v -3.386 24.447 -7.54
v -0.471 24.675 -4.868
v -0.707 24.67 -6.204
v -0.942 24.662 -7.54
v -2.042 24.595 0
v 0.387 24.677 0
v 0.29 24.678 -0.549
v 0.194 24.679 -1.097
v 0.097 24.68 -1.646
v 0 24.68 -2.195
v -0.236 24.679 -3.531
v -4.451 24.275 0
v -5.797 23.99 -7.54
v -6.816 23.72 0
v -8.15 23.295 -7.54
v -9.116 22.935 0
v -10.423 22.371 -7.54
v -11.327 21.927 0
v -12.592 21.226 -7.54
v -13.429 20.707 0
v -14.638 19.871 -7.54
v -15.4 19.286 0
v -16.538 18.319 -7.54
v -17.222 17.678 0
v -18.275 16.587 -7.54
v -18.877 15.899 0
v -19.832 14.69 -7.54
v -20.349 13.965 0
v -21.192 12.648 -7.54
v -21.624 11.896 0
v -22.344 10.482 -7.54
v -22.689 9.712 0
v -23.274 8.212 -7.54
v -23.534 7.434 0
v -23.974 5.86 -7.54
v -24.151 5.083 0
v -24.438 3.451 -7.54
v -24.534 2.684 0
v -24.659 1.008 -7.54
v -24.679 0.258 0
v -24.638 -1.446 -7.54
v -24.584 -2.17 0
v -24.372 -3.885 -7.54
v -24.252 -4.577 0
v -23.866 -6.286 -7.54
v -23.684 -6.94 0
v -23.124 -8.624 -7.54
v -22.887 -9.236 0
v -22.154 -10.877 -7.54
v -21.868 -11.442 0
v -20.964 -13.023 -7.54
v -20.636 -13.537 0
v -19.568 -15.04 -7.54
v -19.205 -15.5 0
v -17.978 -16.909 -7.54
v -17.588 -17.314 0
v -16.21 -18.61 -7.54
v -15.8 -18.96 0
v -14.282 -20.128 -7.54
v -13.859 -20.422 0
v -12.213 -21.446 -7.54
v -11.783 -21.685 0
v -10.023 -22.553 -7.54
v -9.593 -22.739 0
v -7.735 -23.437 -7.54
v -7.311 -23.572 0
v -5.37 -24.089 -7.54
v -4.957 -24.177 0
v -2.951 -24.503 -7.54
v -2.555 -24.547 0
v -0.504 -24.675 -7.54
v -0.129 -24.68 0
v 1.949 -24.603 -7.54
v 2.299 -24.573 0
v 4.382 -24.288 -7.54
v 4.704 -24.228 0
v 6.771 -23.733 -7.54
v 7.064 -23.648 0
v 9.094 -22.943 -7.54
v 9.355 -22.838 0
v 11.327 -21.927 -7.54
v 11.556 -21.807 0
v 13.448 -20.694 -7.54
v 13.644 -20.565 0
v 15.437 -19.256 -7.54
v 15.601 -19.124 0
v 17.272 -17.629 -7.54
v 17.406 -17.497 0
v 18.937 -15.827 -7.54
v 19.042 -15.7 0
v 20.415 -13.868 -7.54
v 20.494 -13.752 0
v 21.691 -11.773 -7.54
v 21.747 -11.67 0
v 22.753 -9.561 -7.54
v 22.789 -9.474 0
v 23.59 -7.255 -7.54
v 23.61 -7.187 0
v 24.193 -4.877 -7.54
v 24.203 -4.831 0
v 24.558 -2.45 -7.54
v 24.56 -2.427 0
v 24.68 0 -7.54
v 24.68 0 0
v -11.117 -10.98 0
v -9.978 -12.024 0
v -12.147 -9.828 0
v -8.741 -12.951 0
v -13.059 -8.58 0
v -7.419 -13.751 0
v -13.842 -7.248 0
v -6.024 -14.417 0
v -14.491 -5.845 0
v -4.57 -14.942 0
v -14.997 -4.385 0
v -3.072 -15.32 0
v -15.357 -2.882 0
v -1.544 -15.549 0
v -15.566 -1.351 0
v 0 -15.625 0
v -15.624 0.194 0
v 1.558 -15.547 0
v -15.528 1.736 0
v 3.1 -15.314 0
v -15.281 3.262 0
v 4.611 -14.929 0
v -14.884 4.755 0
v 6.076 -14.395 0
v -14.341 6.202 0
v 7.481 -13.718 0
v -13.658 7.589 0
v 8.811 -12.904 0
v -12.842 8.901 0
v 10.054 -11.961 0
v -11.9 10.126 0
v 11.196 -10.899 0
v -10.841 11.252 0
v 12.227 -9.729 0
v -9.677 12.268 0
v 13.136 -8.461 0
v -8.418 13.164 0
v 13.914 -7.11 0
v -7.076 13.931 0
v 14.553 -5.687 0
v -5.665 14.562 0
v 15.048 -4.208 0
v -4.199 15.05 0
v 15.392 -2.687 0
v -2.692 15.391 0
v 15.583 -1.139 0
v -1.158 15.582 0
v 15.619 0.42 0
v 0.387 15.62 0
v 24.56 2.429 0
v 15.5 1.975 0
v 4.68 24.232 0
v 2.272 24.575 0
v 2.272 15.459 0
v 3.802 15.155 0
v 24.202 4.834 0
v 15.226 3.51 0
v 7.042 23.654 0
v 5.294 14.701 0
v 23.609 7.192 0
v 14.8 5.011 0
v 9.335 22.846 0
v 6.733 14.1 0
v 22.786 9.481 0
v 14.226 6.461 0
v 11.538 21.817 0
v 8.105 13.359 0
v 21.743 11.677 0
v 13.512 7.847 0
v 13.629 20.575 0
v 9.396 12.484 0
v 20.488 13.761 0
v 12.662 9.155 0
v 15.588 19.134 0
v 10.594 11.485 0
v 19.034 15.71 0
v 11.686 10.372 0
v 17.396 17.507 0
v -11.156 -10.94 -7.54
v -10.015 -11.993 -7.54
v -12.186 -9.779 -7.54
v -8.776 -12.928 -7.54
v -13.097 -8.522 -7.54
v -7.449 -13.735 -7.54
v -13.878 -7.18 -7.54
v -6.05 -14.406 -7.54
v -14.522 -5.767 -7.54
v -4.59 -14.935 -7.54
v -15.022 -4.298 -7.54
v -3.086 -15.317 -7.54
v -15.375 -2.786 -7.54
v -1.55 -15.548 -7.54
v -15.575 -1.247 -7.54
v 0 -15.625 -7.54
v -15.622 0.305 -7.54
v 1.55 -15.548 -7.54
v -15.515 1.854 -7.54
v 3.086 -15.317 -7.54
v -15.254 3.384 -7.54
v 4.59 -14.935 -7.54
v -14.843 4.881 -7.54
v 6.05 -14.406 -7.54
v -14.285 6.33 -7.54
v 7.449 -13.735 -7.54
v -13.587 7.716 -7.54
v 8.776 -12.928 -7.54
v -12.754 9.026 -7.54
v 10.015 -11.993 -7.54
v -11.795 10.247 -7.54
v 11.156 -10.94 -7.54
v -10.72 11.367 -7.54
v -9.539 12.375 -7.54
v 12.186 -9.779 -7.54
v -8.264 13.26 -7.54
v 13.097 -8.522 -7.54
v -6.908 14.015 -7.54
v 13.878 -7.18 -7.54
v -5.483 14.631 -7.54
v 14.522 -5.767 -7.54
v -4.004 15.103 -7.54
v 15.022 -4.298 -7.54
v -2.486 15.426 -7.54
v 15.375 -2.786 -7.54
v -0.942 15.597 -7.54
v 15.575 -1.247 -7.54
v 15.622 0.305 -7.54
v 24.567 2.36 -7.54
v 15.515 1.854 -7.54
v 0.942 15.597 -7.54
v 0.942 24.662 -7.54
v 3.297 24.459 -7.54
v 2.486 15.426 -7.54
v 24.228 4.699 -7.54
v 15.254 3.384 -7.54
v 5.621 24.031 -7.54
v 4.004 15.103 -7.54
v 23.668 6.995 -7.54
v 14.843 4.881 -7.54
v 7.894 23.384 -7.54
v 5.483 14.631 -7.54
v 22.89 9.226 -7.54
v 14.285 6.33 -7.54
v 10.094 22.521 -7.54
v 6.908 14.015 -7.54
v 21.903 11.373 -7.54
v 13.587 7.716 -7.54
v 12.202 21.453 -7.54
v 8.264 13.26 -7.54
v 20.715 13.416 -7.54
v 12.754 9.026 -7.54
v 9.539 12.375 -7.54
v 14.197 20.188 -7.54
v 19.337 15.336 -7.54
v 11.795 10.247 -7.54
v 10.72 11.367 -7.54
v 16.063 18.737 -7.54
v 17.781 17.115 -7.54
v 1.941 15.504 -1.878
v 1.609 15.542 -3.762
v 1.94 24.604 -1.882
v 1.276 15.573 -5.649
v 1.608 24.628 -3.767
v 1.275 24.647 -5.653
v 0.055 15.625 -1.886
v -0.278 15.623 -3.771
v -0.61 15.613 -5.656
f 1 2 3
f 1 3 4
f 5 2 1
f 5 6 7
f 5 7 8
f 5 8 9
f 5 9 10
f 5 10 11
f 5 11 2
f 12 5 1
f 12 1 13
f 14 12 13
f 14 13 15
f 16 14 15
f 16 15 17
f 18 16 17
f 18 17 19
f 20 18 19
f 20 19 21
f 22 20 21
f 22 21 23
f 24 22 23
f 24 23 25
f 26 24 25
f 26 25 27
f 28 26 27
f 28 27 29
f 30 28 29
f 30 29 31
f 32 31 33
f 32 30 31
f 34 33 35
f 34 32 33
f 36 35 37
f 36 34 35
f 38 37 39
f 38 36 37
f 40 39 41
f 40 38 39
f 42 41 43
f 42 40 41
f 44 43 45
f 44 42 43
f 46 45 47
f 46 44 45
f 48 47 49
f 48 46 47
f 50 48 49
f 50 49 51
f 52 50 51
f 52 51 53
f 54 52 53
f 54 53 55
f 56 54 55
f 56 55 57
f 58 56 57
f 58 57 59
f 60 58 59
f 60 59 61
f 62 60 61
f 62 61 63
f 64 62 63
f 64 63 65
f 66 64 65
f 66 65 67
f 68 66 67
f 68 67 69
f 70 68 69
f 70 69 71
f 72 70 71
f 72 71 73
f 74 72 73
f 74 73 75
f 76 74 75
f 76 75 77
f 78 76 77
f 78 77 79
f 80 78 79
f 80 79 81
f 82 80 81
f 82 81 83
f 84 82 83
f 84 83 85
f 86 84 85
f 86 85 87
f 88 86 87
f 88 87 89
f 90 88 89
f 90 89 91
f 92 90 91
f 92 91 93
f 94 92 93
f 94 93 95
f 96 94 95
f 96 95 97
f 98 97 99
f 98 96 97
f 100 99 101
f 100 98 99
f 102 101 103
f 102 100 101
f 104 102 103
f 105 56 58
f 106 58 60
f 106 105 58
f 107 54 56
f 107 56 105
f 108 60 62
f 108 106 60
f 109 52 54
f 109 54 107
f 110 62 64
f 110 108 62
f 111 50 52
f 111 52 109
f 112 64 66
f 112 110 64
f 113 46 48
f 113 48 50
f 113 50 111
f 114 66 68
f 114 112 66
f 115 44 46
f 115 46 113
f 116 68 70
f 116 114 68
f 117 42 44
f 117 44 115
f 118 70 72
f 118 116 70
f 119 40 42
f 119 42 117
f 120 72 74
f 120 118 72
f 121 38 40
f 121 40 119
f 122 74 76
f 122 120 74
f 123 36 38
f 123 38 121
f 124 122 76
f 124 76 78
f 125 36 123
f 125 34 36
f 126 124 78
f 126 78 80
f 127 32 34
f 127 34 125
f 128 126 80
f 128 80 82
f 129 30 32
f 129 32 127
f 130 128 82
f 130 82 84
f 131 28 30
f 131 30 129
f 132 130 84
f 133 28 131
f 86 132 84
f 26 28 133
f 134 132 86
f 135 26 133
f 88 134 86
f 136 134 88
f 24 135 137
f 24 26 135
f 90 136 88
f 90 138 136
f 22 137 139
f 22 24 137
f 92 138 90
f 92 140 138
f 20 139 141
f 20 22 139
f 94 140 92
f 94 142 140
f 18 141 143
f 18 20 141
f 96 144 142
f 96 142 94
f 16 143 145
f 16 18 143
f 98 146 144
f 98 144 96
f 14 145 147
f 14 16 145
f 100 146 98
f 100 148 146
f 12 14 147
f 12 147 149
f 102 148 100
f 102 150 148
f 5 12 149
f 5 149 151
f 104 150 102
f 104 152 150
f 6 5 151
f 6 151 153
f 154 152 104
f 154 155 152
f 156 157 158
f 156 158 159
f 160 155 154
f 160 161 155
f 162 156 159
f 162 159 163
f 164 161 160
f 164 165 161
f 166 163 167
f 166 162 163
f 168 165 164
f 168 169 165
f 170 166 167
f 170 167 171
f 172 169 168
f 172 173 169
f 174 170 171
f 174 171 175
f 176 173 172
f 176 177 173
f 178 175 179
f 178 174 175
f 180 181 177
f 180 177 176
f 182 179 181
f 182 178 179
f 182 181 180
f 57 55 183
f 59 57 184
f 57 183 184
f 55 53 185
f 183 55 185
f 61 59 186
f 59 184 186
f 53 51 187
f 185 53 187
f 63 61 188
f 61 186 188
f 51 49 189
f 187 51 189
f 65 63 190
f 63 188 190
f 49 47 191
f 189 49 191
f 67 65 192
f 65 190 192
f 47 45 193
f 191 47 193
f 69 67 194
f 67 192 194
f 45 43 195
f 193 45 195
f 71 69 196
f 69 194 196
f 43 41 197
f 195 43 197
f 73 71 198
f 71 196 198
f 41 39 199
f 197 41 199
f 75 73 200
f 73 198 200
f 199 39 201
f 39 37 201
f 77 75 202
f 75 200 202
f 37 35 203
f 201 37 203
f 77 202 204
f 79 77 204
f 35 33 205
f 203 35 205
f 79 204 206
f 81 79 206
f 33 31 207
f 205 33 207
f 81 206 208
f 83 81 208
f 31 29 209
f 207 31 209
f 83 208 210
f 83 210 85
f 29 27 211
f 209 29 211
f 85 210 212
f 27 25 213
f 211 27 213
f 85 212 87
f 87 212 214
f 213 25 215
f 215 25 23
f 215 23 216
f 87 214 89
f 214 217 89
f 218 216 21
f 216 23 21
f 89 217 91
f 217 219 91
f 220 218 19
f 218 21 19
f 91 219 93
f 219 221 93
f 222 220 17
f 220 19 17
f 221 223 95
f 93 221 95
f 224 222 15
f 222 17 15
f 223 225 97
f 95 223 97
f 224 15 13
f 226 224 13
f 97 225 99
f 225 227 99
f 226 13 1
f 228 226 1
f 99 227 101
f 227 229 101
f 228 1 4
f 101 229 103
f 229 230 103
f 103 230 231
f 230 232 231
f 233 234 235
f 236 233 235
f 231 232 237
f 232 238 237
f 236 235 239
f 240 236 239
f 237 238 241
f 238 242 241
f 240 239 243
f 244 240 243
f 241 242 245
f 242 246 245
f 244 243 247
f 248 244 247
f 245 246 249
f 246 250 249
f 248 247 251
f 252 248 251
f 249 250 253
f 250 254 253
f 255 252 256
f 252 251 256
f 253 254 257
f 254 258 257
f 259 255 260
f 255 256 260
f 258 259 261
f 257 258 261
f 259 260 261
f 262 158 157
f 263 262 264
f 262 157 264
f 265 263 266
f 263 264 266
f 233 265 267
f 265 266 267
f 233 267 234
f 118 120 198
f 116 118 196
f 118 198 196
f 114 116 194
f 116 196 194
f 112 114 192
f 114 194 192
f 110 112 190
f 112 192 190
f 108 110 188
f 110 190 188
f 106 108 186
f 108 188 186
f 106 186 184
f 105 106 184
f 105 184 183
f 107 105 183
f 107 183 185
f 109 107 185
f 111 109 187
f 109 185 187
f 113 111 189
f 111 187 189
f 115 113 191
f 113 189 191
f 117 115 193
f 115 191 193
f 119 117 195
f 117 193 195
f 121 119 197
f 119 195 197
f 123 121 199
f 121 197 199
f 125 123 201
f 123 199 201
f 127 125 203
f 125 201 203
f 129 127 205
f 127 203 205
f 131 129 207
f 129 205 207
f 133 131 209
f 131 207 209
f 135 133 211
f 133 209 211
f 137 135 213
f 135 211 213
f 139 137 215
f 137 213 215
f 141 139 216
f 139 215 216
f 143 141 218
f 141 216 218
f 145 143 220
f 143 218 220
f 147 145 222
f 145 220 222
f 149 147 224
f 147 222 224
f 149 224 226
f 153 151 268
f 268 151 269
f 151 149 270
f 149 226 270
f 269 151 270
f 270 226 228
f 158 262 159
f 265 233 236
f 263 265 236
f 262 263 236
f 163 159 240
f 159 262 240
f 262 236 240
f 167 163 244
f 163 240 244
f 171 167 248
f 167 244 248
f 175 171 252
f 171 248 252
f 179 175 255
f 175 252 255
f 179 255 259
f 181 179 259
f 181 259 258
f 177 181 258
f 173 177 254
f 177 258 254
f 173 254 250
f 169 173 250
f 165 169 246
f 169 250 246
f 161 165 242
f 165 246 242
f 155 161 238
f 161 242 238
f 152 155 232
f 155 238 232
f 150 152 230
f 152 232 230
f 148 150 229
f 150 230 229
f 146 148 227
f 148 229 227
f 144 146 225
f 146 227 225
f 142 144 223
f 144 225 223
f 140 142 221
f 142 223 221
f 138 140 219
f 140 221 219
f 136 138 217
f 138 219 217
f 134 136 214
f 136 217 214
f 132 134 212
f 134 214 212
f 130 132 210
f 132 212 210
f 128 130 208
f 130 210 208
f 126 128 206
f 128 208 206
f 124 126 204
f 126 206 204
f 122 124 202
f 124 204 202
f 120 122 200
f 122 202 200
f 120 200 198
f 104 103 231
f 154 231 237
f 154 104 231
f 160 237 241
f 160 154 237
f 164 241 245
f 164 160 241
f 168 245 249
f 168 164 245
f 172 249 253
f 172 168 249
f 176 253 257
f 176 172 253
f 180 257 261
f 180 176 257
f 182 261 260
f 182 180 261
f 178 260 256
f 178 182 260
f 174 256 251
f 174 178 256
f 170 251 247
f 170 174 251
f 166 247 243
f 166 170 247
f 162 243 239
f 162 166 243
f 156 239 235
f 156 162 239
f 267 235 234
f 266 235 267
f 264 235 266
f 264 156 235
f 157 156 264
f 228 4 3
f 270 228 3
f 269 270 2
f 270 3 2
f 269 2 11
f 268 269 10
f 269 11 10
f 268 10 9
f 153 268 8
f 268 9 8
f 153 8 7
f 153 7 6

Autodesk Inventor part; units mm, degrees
ref_plane "WorkPlane1" through (0, 0, 0) normal (0, 0, 1) x (1, 0, 0)
ref_plane "WorkPlane3" through (0, 0, -7.54) normal (0, 0, 1) x (1, 0, 0)
ref_plane "Work Plane3" through (0, -24.68, 0) normal (0, 1, 0) x (-1, 0, 0)
ref_plane "WorkPlane10" through (0, 24.68, 0) normal (0, 1, 0) x (-1, 0, 0)
sketch "Sketch1" plane through (0, 0, 0) normal (0, 0, 1) x (1, 0, 0)
  point P0 (0, 0)
sketch "Sketch2" plane through (0, 0, 0) normal (0, 0, 1) x (1, 0, 0)
  circle A0 centre (0, 0) radius 24.68
  dimension "d3" = 49.36
extrude "Extrusion1" add sketch "Sketch2" against normal blind 7.54
sketch "Sketch3" plane through (0, 0, -7.54) normal (0, 0, 1) x (1, 0, 0)
  point P0 (0, 0)
sketch "Sketch4" plane through (0, 0, 0) normal (0, 0, 1) x (1, 0, 0)
  circle A0 centre (0, 0) radius 24.68 projected
hole "Hole1" at (0, 0, 0) direction (0, 0, -1) diameter 31.25 end through all
sketch "Sketch5" plane through (0, 24.68, 0) normal (0, 1, 0) x (-1, 0, 0)
  line L0 (-0.387, 0) -> (-2.272, 0)
  line L1 (0.9425, -7.54) -> (-0.387, 0)
  line L2 (-0.9425, -7.54) -> (0.9425, -7.54)
  line L3 (-2.272, 0) -> (-0.9425, -7.54)
  line L4 (-15.625, 0) -> (15.625, 0) construction
  line L5 (24.68, -7.54) -> (-24.68, -7.54) construction
  line L6 (0, -9.048) -> (0, 1.508) projected
  dimension "d15" = 80
  dimension "d18" = 0.9425
  dimension "d19" = 0.9425
extrude "Extrusion2" cut sketch "Sketch5" against normal blind 24.68
ref_plane "MSC_PT1" through (0, 0, 0) normal (0, 0, 1) x (1, 0, 0)
ref_plane "MSC_PT2" through (0, 0, -7.54) normal (0, 0, -1) x (-1, 0, 0)
equation "\"d7\" = Diam1"
equation "\"d4\" = ParH"
equation "\"d18\" = 0.125 * ParH"
equation "\"d19\" = 0.125 * ParH"
equation "\"d16\" = 0.5 * Diam2"
equation "\"d3\" = Diam2"
equation "\"Diam2\" = 49.36"
equation "\"ParH\" = 7.54"
equation "\"Diam1\" = 31.25"
equation "\"d20\" = 0.5 * Diam2"
properties part number "ASME B18.21.2M - 30" material "Steel, Mild"
